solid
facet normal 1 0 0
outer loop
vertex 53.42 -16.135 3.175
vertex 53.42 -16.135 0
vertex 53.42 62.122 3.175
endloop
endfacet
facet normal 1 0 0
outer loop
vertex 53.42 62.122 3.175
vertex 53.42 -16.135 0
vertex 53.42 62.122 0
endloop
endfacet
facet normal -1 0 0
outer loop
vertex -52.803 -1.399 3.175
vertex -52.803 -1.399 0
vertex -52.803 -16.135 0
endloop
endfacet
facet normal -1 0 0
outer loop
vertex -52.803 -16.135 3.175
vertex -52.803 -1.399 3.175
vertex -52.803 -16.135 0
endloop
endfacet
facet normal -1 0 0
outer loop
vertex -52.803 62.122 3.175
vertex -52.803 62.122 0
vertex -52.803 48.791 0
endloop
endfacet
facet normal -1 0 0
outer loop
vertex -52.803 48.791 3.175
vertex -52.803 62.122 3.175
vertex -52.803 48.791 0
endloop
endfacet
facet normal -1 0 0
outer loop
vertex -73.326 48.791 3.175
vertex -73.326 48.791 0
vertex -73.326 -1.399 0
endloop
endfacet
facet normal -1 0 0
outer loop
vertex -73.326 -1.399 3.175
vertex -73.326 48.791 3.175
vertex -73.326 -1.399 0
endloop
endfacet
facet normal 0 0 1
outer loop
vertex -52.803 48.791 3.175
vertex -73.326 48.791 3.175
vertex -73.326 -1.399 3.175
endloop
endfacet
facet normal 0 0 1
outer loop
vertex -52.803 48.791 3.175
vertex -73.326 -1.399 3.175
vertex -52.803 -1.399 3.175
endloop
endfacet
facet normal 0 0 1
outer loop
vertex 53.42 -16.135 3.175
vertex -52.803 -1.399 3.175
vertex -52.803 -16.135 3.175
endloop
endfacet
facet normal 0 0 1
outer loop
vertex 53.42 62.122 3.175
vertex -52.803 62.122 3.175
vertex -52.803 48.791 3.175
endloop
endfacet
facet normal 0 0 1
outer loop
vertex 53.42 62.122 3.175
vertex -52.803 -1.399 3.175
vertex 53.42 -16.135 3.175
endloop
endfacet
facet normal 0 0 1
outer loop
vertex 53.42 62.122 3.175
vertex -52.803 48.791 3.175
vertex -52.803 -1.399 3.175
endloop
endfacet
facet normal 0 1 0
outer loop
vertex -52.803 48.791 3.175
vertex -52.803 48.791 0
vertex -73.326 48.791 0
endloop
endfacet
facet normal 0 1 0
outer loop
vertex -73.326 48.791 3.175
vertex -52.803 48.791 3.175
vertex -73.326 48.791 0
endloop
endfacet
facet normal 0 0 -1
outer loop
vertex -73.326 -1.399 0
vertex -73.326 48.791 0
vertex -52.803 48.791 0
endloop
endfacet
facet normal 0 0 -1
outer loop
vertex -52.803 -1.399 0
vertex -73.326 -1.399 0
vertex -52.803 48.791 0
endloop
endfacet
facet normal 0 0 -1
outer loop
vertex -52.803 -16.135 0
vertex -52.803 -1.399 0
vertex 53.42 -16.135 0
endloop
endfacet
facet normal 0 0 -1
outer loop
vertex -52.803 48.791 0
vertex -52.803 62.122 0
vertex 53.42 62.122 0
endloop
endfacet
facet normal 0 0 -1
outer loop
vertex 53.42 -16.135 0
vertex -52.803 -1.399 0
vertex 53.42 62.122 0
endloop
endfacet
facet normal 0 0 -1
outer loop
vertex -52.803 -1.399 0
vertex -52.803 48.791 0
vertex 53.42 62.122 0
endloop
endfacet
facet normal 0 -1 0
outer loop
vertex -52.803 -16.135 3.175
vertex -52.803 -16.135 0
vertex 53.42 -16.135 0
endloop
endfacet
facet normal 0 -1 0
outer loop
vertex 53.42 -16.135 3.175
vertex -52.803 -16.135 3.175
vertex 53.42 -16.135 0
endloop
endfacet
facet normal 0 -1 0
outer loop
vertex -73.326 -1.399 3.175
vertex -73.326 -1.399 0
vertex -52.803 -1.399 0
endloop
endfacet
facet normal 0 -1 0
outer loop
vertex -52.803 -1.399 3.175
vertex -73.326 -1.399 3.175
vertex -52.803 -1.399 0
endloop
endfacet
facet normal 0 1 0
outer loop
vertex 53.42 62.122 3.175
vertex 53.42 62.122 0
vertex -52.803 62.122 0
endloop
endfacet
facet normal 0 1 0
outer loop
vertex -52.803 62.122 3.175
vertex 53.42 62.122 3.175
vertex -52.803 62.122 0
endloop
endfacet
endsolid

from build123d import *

# Parameters (mm, degrees)
F1_DEPTH = 3.175


with BuildPart() as f1:
    # F0 (on Top) → F1 (new body)
    with BuildSketch(Plane.XY):
        Polygon((53.419934, 62.122178), (-52.802866, 62.122178), (-52.802866, 57.49908), (-52.802866, 48.79114), (-52.802866, 7.30868), (-52.802866, -1.39926), (-52.802866, -16.135222), (53.419934, -16.135222), align=None)
        Polygon((-52.802866, 7.30868), (-52.802866, 48.79114), (-73.326066, 48.79114), (-73.326066, -1.39926), (-52.802866, -1.39926), align=None)
    extrude(amount=F1_DEPTH)


solid = f1.part
